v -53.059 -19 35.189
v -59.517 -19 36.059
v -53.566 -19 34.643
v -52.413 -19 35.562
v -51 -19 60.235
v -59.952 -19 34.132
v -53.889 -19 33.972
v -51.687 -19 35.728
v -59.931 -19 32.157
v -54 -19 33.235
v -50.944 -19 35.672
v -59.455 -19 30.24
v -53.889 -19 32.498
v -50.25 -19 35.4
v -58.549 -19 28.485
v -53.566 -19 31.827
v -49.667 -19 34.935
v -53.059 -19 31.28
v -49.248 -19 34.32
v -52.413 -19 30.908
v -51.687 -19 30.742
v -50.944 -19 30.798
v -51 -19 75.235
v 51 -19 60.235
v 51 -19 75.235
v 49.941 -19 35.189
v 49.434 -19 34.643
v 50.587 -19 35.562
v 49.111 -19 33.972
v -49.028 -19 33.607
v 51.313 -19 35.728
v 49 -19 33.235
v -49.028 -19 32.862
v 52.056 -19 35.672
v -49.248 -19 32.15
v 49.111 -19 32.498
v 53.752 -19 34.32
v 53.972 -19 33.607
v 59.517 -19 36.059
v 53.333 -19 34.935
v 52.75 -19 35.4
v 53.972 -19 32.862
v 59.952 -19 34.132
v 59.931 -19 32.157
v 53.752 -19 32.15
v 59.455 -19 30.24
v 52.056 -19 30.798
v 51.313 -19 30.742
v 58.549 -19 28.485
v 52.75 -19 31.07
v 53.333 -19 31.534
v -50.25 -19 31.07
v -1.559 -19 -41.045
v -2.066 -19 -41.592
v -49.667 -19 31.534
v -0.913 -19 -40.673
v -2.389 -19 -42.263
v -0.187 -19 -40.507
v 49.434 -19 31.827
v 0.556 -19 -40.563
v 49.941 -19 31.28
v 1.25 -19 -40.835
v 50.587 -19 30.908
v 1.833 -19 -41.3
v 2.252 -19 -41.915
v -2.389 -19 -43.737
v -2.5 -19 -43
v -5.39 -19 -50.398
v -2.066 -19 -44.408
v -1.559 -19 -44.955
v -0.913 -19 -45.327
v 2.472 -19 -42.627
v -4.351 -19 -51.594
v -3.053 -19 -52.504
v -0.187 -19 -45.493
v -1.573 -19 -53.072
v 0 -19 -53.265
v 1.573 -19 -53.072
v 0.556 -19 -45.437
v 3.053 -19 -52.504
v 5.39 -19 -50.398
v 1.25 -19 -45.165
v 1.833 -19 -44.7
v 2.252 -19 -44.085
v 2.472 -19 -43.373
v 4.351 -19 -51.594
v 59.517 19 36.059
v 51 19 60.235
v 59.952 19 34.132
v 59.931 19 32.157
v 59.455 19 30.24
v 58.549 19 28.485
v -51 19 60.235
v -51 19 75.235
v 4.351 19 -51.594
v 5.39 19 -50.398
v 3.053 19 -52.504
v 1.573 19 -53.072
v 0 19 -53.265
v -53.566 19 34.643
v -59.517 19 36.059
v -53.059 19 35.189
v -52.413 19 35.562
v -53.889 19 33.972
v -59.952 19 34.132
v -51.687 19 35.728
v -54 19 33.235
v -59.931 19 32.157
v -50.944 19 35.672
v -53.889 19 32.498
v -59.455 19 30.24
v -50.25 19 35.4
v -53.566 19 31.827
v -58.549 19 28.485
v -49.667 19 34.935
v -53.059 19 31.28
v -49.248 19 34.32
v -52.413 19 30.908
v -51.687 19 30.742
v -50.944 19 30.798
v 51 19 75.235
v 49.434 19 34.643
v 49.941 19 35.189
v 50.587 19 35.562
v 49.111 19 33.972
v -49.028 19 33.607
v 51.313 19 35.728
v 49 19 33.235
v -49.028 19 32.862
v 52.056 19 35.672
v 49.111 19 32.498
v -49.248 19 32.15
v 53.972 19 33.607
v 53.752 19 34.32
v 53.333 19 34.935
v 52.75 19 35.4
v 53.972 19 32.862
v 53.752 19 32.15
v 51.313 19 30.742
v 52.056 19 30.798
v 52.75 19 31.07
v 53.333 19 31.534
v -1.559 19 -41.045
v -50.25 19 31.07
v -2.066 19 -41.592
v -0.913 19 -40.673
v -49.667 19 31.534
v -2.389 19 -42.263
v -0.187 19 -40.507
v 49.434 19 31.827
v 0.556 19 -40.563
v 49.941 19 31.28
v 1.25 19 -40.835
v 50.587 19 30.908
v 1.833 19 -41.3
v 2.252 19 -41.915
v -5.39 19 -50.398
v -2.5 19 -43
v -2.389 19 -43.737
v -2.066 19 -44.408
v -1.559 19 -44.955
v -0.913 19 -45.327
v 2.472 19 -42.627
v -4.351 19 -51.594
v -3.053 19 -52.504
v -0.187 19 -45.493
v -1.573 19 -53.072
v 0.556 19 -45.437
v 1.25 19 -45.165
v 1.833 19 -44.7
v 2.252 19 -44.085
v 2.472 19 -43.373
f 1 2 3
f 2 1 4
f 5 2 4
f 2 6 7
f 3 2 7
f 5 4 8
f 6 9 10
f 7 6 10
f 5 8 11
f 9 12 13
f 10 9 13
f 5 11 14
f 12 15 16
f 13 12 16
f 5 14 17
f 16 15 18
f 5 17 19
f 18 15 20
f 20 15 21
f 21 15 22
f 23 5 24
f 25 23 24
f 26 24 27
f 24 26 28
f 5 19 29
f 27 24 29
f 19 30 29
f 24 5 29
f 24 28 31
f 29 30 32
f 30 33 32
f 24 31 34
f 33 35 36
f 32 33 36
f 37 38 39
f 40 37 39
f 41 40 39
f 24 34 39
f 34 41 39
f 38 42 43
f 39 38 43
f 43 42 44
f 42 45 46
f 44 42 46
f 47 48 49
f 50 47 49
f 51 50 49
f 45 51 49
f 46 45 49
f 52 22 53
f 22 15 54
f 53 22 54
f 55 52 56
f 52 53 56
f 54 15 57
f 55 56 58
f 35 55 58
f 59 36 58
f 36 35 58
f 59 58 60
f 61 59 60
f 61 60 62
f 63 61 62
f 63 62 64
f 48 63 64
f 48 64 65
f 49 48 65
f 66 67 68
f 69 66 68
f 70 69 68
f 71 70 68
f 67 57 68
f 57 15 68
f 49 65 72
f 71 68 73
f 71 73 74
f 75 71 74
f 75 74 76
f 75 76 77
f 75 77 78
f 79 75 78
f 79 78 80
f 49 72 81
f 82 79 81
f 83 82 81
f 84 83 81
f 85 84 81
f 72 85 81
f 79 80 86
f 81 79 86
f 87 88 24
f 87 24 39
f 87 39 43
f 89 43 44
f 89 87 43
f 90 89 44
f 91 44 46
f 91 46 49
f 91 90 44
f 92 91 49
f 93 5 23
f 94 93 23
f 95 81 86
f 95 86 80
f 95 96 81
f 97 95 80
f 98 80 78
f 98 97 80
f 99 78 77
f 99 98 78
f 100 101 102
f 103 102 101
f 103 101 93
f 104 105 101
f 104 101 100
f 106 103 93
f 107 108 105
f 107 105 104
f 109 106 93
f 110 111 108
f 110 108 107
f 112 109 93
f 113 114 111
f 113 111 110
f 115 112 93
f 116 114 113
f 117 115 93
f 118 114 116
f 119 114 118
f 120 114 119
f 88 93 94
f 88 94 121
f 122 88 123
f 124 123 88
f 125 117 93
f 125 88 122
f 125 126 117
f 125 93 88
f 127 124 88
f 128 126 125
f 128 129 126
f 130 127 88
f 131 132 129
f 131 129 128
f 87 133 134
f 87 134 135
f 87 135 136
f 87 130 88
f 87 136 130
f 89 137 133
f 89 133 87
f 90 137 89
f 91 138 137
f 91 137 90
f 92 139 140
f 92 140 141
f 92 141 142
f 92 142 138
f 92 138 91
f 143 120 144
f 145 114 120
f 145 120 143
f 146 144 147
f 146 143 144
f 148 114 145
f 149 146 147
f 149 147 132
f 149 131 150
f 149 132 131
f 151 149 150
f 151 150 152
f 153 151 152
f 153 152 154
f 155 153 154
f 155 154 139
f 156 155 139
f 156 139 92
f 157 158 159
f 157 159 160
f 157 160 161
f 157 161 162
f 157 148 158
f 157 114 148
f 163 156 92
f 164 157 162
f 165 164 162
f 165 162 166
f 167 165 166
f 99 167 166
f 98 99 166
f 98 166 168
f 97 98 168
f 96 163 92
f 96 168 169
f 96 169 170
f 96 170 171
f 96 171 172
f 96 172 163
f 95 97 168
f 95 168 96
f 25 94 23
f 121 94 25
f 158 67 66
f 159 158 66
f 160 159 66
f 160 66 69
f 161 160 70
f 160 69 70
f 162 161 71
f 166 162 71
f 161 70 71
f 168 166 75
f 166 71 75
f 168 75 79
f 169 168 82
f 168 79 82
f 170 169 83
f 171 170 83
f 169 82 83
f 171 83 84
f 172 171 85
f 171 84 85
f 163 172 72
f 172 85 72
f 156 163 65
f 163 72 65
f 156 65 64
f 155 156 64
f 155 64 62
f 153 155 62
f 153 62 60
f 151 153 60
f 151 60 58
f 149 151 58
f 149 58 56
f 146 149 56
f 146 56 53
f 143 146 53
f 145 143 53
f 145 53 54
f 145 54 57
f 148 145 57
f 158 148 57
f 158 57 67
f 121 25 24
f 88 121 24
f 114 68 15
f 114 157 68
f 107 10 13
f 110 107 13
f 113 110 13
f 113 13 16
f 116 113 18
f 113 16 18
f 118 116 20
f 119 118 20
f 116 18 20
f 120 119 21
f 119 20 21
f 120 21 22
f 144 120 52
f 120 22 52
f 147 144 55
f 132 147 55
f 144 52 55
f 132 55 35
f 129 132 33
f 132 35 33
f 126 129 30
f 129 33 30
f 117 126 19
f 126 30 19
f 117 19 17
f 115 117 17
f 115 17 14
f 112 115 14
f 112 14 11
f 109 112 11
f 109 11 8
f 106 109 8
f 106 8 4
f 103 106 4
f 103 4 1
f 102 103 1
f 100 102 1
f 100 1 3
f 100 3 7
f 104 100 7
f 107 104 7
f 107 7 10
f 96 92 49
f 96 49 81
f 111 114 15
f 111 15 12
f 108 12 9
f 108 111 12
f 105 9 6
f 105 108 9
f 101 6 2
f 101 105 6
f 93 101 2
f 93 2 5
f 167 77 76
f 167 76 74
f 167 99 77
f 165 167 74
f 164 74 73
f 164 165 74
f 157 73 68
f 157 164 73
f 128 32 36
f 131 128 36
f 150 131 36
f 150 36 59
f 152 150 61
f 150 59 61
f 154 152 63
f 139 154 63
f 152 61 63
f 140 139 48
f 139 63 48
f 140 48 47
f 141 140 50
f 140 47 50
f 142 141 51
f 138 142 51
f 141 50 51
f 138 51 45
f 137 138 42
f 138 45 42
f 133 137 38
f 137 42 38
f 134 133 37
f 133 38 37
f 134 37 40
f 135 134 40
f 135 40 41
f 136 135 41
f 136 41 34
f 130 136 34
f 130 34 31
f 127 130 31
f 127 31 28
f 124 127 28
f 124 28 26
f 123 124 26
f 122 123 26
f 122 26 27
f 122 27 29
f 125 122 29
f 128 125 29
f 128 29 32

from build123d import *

# Parameters (mm, degrees)
BASE_MODEL_DEPTH         = 19
F_5_0_5_DIAMETER_HOLE1_D = 5


with BuildPart() as part:
    # Top → Base Model (new, symmetric)
    with BuildSketch(Plane(origin=(0, 0, 0), x_dir=(1, 0, 0), z_dir=(0, 1, 0))):
        with BuildLine():
            Line((-5.390272104, 50.397653109), (-58.548817366, -28.484658378))
            ThreePointArc((-58.548817366, -28.484658378), (-59.931398216, -32.157094268), (-59.517033361, -36.059224064))
            Line((-59.517033361, -36.059224064), (-51, -60.234834557))
            Line((-51, -60.234834557), (-51, -75.234834557))
            Line((-51, -75.234834557), (51, -75.234834557))
            Line((51, -75.234834557), (51, -60.234834557))
            Line((51, -60.234834557), (59.517033361, -36.059224064))
            ThreePointArc((59.517033361, -36.059224064), (59.931398216, -32.157094268), (58.548817366, -28.484658378))
            Line((58.548817366, -28.484658378), (5.390272104, 50.397653109))
            ThreePointArc((5.390272104, 50.397653109), (3.052771705, 52.503683101), (0, 53.265165443))
            ThreePointArc((0, 53.265165443), (-3.052771705, 52.503683101), (-5.390272104, 50.397653109))
        make_face()
    extrude(amount=BASE_MODEL_DEPTH, both=True)

    # Ø5.0 (5) Diameter Hole1 (through all)
    with Locations(Plane(origin=(0, 19, 0), x_dir=(1, 0, 0), z_dir=(0, 1, 0))):
        with Locations((-51.5, -33.234834557), (0, 43), (51.5, -33.234834557)):
            Hole(F_5_0_5_DIAMETER_HOLE1_D / 2)


solid = part.part
